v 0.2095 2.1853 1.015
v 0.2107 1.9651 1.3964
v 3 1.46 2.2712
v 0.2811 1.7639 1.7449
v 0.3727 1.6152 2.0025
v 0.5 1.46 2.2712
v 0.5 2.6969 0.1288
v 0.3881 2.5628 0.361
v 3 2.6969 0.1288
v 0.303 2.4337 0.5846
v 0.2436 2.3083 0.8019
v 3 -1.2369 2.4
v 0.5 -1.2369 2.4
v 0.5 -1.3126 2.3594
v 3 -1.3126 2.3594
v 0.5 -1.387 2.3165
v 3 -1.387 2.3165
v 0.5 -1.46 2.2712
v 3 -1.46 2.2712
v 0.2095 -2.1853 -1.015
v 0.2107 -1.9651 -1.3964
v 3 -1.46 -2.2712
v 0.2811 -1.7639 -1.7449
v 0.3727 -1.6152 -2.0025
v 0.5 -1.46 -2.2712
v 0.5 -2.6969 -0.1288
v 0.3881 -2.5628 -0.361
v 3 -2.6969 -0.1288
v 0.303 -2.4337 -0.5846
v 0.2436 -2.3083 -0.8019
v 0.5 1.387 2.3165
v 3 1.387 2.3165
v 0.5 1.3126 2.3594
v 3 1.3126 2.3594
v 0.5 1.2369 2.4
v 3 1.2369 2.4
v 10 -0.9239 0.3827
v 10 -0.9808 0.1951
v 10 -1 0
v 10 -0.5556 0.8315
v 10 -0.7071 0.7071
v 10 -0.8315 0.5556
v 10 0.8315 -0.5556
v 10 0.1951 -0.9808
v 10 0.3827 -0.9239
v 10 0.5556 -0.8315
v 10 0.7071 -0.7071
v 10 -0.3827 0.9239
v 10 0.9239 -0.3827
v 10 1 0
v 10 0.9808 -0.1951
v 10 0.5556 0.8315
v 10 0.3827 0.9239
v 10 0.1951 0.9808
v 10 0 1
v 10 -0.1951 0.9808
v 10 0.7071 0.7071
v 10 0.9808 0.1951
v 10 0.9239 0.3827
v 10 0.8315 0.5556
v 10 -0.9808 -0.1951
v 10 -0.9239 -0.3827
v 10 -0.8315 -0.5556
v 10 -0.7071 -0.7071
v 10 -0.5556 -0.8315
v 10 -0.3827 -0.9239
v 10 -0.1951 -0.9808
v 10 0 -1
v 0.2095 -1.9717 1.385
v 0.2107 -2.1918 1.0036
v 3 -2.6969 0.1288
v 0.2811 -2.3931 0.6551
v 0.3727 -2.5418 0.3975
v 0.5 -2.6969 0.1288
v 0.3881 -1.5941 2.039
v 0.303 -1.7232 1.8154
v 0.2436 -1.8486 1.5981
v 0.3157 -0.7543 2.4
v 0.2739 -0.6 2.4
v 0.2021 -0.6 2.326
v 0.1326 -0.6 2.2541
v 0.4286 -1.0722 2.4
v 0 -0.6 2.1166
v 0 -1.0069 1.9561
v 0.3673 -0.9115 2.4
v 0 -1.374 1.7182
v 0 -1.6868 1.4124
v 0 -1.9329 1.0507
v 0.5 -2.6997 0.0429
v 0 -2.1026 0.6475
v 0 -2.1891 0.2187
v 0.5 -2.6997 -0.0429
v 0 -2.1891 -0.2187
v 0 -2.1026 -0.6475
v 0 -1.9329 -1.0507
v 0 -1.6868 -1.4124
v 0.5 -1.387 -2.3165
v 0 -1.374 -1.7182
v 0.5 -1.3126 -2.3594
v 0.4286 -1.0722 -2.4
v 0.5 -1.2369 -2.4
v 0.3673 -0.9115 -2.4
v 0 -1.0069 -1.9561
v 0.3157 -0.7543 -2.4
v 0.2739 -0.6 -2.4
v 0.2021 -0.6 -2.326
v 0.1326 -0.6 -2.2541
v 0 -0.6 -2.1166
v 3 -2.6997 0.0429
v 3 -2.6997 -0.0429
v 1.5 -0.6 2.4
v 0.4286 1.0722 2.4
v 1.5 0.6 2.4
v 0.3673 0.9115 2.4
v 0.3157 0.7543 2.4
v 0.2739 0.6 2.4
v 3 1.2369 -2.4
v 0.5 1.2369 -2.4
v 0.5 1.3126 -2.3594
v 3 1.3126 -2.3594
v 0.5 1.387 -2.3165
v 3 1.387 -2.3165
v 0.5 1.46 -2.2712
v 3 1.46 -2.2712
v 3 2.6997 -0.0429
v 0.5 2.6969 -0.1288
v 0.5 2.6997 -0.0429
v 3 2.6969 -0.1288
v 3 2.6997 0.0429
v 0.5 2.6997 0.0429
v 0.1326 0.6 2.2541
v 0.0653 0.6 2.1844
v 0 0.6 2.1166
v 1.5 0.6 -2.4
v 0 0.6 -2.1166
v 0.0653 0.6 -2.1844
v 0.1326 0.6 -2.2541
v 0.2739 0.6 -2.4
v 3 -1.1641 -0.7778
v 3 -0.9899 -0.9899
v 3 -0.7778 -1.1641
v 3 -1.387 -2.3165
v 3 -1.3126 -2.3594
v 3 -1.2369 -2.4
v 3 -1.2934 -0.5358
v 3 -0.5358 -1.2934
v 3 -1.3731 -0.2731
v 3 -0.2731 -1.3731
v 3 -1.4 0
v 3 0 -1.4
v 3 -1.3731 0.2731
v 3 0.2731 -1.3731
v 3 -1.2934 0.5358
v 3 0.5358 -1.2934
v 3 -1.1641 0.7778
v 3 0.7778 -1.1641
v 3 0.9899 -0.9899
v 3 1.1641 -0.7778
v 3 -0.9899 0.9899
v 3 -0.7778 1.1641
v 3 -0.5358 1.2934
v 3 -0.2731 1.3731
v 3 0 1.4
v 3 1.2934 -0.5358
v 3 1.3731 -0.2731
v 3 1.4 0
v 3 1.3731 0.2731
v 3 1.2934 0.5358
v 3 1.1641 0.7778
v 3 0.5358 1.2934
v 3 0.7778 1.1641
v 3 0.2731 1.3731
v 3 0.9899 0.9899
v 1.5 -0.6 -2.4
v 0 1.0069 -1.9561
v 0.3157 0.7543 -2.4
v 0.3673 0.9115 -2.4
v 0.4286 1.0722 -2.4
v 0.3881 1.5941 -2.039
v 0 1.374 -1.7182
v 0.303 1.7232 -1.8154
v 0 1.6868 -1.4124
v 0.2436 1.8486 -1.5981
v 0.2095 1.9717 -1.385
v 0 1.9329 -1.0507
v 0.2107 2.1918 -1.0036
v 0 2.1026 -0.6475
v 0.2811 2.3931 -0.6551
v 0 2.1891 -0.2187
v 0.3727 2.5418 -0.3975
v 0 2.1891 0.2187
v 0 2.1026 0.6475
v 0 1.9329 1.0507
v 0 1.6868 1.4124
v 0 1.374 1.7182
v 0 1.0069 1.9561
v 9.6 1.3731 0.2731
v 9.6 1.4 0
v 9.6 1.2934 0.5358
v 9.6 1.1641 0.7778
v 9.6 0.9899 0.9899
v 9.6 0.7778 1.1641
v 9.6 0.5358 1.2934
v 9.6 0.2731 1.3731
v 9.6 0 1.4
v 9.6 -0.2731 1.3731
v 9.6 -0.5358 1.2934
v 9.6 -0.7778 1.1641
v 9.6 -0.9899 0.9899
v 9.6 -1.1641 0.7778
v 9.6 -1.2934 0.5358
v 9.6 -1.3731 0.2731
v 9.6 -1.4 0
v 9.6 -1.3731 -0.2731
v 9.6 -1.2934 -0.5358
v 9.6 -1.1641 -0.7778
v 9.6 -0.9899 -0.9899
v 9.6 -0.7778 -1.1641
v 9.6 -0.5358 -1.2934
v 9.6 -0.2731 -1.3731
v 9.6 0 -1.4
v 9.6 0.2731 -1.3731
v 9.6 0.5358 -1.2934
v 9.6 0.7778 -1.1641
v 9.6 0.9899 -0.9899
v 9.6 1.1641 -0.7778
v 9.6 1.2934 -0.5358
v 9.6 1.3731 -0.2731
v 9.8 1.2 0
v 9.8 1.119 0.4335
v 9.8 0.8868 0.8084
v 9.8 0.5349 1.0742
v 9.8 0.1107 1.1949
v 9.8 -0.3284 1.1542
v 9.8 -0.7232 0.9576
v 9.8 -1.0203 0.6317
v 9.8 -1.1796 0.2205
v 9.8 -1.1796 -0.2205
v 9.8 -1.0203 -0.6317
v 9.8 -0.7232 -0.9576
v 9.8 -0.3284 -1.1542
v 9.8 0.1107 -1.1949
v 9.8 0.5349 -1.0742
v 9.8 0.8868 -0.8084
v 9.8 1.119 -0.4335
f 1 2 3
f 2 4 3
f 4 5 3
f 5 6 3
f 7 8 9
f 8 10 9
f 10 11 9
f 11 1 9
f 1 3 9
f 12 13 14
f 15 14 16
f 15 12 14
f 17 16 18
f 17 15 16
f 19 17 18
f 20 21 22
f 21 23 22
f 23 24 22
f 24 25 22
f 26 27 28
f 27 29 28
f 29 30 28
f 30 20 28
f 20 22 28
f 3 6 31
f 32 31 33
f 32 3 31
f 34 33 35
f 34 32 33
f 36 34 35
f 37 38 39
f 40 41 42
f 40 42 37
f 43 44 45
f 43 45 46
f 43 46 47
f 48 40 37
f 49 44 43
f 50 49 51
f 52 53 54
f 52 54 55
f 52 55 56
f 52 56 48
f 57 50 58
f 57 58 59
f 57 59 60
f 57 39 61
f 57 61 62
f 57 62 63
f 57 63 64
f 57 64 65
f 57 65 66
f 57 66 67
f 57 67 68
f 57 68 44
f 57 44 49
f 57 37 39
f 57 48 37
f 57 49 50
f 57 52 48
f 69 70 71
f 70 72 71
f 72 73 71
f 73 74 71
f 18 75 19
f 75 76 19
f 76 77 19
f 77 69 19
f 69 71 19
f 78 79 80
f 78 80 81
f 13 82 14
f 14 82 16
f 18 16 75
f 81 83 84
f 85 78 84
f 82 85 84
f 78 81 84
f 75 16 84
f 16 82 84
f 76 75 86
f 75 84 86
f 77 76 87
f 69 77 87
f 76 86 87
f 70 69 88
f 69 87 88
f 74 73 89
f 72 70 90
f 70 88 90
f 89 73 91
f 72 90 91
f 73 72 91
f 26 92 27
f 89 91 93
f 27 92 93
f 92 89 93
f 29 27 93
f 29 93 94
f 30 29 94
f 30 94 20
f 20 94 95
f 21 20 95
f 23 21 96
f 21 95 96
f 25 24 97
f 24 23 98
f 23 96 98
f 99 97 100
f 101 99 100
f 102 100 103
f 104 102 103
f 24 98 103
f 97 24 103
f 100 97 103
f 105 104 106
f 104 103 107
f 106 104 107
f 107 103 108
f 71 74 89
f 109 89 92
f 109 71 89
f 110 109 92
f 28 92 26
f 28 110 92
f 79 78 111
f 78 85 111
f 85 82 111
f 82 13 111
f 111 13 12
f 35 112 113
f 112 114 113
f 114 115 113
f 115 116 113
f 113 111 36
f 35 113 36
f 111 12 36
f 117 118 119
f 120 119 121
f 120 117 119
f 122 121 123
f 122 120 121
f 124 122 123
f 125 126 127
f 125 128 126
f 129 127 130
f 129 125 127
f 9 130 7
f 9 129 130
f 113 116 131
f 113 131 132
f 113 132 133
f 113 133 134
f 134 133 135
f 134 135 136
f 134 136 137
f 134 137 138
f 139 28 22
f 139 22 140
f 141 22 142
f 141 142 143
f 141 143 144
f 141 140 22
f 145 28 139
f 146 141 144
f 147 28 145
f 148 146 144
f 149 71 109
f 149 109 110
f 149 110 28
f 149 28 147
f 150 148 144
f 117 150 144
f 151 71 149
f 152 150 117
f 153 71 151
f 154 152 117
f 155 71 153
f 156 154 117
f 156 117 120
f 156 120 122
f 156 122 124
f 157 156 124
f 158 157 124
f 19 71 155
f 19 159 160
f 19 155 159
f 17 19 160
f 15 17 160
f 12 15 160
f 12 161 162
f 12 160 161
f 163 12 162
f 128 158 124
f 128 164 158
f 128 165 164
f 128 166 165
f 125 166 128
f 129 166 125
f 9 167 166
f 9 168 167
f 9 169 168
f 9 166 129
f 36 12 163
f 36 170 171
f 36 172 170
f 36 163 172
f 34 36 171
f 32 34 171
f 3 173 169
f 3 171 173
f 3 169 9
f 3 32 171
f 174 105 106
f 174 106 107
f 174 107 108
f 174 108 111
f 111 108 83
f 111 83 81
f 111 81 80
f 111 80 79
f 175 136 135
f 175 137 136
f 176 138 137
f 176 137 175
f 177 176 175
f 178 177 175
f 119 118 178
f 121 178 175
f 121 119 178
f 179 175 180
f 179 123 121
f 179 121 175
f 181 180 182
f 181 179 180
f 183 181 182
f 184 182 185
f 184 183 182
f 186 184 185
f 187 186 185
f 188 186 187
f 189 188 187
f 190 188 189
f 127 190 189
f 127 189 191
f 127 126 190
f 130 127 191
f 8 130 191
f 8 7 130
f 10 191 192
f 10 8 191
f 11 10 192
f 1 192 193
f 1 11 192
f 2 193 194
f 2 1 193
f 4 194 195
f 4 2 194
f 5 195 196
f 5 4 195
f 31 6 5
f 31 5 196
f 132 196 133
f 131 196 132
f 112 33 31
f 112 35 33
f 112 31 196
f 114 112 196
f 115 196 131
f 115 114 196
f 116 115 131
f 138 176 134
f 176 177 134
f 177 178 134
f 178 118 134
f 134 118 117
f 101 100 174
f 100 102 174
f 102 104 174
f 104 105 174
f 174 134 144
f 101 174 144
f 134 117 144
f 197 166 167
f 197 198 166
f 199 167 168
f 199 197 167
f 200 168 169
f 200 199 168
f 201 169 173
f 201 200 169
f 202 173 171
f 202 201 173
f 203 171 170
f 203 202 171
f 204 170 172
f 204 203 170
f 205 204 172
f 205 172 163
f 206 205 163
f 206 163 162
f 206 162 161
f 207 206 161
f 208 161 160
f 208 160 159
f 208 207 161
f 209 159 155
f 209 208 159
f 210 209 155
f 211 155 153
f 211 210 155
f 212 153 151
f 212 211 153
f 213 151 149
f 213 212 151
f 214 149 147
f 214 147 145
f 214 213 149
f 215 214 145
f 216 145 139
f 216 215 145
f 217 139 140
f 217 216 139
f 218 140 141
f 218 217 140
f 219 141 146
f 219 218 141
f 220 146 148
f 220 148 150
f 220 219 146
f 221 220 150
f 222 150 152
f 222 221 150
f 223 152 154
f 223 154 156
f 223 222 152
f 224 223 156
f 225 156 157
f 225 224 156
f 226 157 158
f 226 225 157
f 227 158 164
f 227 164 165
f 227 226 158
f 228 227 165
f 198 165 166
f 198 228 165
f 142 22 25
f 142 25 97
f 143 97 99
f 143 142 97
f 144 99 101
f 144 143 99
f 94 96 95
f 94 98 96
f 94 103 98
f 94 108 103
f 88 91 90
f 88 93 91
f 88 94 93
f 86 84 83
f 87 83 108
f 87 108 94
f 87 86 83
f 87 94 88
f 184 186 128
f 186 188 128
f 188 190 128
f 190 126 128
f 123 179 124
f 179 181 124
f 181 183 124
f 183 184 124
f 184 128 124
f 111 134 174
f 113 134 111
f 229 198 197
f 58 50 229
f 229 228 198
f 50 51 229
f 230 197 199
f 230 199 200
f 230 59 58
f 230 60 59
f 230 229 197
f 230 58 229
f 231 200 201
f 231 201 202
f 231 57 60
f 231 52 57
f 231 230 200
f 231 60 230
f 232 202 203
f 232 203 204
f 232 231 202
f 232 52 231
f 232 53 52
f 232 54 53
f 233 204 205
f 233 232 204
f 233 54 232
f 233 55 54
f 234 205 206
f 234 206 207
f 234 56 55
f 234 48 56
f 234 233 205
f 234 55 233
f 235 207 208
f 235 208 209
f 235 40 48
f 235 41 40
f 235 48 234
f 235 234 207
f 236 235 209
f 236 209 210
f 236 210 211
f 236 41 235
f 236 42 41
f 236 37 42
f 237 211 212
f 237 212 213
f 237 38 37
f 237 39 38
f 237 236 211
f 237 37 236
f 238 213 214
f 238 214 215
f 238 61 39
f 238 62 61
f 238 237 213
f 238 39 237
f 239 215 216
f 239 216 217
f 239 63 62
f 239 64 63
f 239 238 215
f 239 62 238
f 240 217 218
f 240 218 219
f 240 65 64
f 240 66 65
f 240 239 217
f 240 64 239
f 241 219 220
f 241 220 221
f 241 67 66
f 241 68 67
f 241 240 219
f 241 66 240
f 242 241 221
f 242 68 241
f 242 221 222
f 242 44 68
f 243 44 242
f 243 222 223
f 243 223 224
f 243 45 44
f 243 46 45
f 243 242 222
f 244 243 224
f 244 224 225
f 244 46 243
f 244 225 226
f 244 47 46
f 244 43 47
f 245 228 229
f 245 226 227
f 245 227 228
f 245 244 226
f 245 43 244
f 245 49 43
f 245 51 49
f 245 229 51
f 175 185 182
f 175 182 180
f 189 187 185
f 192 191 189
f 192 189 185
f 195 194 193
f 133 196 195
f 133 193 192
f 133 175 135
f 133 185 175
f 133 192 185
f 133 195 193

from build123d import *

# Parameters (mm, degrees)
CUT_EXTRUDE_2_DEPTH = 1.5
CHAMFER_1_SIZE      = 0.5
CUT_EXTRUDE_3_DEPTH = 4


with BuildPart() as part:
    # Эскиз1 → Повернуть1 (revolve)
    with BuildSketch(Plane.XY):
        Polygon((0, 0), (0, 2.7), (3, 2.7), (3, 1.4), (9.6, 1.4), (10, 1), (10, 0), align=None)
    revolve(axis=Axis((-1.2940953, 0, 0), (1, 0, 0)))

    # Эскиз2 → Вырез-Вытянуть2 (cut)
    with BuildSketch(Plane.ZY):
        with BuildLine():
            Line((2.632489316, 0.6), (-2.632489316, 0.6))
            ThreePointArc((-2.632489316, 0.6), (-2.7, 0), (-2.632489316, -0.6))
            Line((-2.632489316, -0.6), (2.632489316, -0.6))
            ThreePointArc((2.632489316, -0.6), (2.683069246, -0.301893066), (2.7, 0))
            ThreePointArc((2.7, 0), (2.683069246, 0.301893066), (2.632489316, 0.6))
        make_face()
    extrude(amount=-CUT_EXTRUDE_2_DEPTH, mode=Mode.SUBTRACT)

    # Фаска1
    chamfer_1_edges = [part.edges().sort_by_distance(p)[0] for p in [
        (0, -2.7, 0),
        (0, 2.110687092, 1.683745824),
    ]]
    chamfer(chamfer_1_edges, length=CHAMFER_1_SIZE)

    # Эскиз4 → Вырез-Вытянуть3 (cut, through all)
    with BuildSketch(Plane(origin=(3, 0, 0), x_dir=(0, 0, -1), z_dir=(1, 0, 0))):
        with BuildLine():
            ThreePointArc((2.271214264, 1.459995125), (1.35, 2.33826859), (0.128785736, 2.696926813))
            Line((0.128785736, 2.696926813), (2.271214264, 1.459995125))
        make_face()
        with BuildLine():
            Line((-2.271214264, 1.459995125), (-0.128785736, 2.696926813))
            ThreePointArc((-0.128785736, 2.696926813), (-1.35, 2.33826859), (-2.271214264, 1.459995125))
        make_face()
        with BuildLine():
            Line((-2.4, -1.236931688), (-2.4, 1.236931688))
            ThreePointArc((-2.4, 1.236931688), (-2.7, 0), (-2.4, -1.236931688))
        make_face()
        with BuildLine():
            Line((-0.128785736, -2.696926813), (-2.271214264, -1.459995125))
            ThreePointArc((-2.271214264, -1.459995125), (-1.35, -2.33826859), (-0.128785736, -2.696926813))
        make_face()
        with BuildLine():
            ThreePointArc((0.128785736, -2.696926813), (1.35, -2.33826859), (2.271214264, -1.459995125))
            Line((2.271214264, -1.459995125), (0.128785736, -2.696926813))
        make_face()
        with BuildLine():
            ThreePointArc((2.7, 0), (2.623928353, 0.636396103), (2.4, 1.236931688))
            Line((2.4, 1.236931688), (2.4, -1.236931688))
            ThreePointArc((2.4, -1.236931688), (2.623928353, -0.636396103), (2.7, 0))
        make_face()
    extrude(amount=-CUT_EXTRUDE_3_DEPTH, mode=Mode.SUBTRACT)


solid = part.part
